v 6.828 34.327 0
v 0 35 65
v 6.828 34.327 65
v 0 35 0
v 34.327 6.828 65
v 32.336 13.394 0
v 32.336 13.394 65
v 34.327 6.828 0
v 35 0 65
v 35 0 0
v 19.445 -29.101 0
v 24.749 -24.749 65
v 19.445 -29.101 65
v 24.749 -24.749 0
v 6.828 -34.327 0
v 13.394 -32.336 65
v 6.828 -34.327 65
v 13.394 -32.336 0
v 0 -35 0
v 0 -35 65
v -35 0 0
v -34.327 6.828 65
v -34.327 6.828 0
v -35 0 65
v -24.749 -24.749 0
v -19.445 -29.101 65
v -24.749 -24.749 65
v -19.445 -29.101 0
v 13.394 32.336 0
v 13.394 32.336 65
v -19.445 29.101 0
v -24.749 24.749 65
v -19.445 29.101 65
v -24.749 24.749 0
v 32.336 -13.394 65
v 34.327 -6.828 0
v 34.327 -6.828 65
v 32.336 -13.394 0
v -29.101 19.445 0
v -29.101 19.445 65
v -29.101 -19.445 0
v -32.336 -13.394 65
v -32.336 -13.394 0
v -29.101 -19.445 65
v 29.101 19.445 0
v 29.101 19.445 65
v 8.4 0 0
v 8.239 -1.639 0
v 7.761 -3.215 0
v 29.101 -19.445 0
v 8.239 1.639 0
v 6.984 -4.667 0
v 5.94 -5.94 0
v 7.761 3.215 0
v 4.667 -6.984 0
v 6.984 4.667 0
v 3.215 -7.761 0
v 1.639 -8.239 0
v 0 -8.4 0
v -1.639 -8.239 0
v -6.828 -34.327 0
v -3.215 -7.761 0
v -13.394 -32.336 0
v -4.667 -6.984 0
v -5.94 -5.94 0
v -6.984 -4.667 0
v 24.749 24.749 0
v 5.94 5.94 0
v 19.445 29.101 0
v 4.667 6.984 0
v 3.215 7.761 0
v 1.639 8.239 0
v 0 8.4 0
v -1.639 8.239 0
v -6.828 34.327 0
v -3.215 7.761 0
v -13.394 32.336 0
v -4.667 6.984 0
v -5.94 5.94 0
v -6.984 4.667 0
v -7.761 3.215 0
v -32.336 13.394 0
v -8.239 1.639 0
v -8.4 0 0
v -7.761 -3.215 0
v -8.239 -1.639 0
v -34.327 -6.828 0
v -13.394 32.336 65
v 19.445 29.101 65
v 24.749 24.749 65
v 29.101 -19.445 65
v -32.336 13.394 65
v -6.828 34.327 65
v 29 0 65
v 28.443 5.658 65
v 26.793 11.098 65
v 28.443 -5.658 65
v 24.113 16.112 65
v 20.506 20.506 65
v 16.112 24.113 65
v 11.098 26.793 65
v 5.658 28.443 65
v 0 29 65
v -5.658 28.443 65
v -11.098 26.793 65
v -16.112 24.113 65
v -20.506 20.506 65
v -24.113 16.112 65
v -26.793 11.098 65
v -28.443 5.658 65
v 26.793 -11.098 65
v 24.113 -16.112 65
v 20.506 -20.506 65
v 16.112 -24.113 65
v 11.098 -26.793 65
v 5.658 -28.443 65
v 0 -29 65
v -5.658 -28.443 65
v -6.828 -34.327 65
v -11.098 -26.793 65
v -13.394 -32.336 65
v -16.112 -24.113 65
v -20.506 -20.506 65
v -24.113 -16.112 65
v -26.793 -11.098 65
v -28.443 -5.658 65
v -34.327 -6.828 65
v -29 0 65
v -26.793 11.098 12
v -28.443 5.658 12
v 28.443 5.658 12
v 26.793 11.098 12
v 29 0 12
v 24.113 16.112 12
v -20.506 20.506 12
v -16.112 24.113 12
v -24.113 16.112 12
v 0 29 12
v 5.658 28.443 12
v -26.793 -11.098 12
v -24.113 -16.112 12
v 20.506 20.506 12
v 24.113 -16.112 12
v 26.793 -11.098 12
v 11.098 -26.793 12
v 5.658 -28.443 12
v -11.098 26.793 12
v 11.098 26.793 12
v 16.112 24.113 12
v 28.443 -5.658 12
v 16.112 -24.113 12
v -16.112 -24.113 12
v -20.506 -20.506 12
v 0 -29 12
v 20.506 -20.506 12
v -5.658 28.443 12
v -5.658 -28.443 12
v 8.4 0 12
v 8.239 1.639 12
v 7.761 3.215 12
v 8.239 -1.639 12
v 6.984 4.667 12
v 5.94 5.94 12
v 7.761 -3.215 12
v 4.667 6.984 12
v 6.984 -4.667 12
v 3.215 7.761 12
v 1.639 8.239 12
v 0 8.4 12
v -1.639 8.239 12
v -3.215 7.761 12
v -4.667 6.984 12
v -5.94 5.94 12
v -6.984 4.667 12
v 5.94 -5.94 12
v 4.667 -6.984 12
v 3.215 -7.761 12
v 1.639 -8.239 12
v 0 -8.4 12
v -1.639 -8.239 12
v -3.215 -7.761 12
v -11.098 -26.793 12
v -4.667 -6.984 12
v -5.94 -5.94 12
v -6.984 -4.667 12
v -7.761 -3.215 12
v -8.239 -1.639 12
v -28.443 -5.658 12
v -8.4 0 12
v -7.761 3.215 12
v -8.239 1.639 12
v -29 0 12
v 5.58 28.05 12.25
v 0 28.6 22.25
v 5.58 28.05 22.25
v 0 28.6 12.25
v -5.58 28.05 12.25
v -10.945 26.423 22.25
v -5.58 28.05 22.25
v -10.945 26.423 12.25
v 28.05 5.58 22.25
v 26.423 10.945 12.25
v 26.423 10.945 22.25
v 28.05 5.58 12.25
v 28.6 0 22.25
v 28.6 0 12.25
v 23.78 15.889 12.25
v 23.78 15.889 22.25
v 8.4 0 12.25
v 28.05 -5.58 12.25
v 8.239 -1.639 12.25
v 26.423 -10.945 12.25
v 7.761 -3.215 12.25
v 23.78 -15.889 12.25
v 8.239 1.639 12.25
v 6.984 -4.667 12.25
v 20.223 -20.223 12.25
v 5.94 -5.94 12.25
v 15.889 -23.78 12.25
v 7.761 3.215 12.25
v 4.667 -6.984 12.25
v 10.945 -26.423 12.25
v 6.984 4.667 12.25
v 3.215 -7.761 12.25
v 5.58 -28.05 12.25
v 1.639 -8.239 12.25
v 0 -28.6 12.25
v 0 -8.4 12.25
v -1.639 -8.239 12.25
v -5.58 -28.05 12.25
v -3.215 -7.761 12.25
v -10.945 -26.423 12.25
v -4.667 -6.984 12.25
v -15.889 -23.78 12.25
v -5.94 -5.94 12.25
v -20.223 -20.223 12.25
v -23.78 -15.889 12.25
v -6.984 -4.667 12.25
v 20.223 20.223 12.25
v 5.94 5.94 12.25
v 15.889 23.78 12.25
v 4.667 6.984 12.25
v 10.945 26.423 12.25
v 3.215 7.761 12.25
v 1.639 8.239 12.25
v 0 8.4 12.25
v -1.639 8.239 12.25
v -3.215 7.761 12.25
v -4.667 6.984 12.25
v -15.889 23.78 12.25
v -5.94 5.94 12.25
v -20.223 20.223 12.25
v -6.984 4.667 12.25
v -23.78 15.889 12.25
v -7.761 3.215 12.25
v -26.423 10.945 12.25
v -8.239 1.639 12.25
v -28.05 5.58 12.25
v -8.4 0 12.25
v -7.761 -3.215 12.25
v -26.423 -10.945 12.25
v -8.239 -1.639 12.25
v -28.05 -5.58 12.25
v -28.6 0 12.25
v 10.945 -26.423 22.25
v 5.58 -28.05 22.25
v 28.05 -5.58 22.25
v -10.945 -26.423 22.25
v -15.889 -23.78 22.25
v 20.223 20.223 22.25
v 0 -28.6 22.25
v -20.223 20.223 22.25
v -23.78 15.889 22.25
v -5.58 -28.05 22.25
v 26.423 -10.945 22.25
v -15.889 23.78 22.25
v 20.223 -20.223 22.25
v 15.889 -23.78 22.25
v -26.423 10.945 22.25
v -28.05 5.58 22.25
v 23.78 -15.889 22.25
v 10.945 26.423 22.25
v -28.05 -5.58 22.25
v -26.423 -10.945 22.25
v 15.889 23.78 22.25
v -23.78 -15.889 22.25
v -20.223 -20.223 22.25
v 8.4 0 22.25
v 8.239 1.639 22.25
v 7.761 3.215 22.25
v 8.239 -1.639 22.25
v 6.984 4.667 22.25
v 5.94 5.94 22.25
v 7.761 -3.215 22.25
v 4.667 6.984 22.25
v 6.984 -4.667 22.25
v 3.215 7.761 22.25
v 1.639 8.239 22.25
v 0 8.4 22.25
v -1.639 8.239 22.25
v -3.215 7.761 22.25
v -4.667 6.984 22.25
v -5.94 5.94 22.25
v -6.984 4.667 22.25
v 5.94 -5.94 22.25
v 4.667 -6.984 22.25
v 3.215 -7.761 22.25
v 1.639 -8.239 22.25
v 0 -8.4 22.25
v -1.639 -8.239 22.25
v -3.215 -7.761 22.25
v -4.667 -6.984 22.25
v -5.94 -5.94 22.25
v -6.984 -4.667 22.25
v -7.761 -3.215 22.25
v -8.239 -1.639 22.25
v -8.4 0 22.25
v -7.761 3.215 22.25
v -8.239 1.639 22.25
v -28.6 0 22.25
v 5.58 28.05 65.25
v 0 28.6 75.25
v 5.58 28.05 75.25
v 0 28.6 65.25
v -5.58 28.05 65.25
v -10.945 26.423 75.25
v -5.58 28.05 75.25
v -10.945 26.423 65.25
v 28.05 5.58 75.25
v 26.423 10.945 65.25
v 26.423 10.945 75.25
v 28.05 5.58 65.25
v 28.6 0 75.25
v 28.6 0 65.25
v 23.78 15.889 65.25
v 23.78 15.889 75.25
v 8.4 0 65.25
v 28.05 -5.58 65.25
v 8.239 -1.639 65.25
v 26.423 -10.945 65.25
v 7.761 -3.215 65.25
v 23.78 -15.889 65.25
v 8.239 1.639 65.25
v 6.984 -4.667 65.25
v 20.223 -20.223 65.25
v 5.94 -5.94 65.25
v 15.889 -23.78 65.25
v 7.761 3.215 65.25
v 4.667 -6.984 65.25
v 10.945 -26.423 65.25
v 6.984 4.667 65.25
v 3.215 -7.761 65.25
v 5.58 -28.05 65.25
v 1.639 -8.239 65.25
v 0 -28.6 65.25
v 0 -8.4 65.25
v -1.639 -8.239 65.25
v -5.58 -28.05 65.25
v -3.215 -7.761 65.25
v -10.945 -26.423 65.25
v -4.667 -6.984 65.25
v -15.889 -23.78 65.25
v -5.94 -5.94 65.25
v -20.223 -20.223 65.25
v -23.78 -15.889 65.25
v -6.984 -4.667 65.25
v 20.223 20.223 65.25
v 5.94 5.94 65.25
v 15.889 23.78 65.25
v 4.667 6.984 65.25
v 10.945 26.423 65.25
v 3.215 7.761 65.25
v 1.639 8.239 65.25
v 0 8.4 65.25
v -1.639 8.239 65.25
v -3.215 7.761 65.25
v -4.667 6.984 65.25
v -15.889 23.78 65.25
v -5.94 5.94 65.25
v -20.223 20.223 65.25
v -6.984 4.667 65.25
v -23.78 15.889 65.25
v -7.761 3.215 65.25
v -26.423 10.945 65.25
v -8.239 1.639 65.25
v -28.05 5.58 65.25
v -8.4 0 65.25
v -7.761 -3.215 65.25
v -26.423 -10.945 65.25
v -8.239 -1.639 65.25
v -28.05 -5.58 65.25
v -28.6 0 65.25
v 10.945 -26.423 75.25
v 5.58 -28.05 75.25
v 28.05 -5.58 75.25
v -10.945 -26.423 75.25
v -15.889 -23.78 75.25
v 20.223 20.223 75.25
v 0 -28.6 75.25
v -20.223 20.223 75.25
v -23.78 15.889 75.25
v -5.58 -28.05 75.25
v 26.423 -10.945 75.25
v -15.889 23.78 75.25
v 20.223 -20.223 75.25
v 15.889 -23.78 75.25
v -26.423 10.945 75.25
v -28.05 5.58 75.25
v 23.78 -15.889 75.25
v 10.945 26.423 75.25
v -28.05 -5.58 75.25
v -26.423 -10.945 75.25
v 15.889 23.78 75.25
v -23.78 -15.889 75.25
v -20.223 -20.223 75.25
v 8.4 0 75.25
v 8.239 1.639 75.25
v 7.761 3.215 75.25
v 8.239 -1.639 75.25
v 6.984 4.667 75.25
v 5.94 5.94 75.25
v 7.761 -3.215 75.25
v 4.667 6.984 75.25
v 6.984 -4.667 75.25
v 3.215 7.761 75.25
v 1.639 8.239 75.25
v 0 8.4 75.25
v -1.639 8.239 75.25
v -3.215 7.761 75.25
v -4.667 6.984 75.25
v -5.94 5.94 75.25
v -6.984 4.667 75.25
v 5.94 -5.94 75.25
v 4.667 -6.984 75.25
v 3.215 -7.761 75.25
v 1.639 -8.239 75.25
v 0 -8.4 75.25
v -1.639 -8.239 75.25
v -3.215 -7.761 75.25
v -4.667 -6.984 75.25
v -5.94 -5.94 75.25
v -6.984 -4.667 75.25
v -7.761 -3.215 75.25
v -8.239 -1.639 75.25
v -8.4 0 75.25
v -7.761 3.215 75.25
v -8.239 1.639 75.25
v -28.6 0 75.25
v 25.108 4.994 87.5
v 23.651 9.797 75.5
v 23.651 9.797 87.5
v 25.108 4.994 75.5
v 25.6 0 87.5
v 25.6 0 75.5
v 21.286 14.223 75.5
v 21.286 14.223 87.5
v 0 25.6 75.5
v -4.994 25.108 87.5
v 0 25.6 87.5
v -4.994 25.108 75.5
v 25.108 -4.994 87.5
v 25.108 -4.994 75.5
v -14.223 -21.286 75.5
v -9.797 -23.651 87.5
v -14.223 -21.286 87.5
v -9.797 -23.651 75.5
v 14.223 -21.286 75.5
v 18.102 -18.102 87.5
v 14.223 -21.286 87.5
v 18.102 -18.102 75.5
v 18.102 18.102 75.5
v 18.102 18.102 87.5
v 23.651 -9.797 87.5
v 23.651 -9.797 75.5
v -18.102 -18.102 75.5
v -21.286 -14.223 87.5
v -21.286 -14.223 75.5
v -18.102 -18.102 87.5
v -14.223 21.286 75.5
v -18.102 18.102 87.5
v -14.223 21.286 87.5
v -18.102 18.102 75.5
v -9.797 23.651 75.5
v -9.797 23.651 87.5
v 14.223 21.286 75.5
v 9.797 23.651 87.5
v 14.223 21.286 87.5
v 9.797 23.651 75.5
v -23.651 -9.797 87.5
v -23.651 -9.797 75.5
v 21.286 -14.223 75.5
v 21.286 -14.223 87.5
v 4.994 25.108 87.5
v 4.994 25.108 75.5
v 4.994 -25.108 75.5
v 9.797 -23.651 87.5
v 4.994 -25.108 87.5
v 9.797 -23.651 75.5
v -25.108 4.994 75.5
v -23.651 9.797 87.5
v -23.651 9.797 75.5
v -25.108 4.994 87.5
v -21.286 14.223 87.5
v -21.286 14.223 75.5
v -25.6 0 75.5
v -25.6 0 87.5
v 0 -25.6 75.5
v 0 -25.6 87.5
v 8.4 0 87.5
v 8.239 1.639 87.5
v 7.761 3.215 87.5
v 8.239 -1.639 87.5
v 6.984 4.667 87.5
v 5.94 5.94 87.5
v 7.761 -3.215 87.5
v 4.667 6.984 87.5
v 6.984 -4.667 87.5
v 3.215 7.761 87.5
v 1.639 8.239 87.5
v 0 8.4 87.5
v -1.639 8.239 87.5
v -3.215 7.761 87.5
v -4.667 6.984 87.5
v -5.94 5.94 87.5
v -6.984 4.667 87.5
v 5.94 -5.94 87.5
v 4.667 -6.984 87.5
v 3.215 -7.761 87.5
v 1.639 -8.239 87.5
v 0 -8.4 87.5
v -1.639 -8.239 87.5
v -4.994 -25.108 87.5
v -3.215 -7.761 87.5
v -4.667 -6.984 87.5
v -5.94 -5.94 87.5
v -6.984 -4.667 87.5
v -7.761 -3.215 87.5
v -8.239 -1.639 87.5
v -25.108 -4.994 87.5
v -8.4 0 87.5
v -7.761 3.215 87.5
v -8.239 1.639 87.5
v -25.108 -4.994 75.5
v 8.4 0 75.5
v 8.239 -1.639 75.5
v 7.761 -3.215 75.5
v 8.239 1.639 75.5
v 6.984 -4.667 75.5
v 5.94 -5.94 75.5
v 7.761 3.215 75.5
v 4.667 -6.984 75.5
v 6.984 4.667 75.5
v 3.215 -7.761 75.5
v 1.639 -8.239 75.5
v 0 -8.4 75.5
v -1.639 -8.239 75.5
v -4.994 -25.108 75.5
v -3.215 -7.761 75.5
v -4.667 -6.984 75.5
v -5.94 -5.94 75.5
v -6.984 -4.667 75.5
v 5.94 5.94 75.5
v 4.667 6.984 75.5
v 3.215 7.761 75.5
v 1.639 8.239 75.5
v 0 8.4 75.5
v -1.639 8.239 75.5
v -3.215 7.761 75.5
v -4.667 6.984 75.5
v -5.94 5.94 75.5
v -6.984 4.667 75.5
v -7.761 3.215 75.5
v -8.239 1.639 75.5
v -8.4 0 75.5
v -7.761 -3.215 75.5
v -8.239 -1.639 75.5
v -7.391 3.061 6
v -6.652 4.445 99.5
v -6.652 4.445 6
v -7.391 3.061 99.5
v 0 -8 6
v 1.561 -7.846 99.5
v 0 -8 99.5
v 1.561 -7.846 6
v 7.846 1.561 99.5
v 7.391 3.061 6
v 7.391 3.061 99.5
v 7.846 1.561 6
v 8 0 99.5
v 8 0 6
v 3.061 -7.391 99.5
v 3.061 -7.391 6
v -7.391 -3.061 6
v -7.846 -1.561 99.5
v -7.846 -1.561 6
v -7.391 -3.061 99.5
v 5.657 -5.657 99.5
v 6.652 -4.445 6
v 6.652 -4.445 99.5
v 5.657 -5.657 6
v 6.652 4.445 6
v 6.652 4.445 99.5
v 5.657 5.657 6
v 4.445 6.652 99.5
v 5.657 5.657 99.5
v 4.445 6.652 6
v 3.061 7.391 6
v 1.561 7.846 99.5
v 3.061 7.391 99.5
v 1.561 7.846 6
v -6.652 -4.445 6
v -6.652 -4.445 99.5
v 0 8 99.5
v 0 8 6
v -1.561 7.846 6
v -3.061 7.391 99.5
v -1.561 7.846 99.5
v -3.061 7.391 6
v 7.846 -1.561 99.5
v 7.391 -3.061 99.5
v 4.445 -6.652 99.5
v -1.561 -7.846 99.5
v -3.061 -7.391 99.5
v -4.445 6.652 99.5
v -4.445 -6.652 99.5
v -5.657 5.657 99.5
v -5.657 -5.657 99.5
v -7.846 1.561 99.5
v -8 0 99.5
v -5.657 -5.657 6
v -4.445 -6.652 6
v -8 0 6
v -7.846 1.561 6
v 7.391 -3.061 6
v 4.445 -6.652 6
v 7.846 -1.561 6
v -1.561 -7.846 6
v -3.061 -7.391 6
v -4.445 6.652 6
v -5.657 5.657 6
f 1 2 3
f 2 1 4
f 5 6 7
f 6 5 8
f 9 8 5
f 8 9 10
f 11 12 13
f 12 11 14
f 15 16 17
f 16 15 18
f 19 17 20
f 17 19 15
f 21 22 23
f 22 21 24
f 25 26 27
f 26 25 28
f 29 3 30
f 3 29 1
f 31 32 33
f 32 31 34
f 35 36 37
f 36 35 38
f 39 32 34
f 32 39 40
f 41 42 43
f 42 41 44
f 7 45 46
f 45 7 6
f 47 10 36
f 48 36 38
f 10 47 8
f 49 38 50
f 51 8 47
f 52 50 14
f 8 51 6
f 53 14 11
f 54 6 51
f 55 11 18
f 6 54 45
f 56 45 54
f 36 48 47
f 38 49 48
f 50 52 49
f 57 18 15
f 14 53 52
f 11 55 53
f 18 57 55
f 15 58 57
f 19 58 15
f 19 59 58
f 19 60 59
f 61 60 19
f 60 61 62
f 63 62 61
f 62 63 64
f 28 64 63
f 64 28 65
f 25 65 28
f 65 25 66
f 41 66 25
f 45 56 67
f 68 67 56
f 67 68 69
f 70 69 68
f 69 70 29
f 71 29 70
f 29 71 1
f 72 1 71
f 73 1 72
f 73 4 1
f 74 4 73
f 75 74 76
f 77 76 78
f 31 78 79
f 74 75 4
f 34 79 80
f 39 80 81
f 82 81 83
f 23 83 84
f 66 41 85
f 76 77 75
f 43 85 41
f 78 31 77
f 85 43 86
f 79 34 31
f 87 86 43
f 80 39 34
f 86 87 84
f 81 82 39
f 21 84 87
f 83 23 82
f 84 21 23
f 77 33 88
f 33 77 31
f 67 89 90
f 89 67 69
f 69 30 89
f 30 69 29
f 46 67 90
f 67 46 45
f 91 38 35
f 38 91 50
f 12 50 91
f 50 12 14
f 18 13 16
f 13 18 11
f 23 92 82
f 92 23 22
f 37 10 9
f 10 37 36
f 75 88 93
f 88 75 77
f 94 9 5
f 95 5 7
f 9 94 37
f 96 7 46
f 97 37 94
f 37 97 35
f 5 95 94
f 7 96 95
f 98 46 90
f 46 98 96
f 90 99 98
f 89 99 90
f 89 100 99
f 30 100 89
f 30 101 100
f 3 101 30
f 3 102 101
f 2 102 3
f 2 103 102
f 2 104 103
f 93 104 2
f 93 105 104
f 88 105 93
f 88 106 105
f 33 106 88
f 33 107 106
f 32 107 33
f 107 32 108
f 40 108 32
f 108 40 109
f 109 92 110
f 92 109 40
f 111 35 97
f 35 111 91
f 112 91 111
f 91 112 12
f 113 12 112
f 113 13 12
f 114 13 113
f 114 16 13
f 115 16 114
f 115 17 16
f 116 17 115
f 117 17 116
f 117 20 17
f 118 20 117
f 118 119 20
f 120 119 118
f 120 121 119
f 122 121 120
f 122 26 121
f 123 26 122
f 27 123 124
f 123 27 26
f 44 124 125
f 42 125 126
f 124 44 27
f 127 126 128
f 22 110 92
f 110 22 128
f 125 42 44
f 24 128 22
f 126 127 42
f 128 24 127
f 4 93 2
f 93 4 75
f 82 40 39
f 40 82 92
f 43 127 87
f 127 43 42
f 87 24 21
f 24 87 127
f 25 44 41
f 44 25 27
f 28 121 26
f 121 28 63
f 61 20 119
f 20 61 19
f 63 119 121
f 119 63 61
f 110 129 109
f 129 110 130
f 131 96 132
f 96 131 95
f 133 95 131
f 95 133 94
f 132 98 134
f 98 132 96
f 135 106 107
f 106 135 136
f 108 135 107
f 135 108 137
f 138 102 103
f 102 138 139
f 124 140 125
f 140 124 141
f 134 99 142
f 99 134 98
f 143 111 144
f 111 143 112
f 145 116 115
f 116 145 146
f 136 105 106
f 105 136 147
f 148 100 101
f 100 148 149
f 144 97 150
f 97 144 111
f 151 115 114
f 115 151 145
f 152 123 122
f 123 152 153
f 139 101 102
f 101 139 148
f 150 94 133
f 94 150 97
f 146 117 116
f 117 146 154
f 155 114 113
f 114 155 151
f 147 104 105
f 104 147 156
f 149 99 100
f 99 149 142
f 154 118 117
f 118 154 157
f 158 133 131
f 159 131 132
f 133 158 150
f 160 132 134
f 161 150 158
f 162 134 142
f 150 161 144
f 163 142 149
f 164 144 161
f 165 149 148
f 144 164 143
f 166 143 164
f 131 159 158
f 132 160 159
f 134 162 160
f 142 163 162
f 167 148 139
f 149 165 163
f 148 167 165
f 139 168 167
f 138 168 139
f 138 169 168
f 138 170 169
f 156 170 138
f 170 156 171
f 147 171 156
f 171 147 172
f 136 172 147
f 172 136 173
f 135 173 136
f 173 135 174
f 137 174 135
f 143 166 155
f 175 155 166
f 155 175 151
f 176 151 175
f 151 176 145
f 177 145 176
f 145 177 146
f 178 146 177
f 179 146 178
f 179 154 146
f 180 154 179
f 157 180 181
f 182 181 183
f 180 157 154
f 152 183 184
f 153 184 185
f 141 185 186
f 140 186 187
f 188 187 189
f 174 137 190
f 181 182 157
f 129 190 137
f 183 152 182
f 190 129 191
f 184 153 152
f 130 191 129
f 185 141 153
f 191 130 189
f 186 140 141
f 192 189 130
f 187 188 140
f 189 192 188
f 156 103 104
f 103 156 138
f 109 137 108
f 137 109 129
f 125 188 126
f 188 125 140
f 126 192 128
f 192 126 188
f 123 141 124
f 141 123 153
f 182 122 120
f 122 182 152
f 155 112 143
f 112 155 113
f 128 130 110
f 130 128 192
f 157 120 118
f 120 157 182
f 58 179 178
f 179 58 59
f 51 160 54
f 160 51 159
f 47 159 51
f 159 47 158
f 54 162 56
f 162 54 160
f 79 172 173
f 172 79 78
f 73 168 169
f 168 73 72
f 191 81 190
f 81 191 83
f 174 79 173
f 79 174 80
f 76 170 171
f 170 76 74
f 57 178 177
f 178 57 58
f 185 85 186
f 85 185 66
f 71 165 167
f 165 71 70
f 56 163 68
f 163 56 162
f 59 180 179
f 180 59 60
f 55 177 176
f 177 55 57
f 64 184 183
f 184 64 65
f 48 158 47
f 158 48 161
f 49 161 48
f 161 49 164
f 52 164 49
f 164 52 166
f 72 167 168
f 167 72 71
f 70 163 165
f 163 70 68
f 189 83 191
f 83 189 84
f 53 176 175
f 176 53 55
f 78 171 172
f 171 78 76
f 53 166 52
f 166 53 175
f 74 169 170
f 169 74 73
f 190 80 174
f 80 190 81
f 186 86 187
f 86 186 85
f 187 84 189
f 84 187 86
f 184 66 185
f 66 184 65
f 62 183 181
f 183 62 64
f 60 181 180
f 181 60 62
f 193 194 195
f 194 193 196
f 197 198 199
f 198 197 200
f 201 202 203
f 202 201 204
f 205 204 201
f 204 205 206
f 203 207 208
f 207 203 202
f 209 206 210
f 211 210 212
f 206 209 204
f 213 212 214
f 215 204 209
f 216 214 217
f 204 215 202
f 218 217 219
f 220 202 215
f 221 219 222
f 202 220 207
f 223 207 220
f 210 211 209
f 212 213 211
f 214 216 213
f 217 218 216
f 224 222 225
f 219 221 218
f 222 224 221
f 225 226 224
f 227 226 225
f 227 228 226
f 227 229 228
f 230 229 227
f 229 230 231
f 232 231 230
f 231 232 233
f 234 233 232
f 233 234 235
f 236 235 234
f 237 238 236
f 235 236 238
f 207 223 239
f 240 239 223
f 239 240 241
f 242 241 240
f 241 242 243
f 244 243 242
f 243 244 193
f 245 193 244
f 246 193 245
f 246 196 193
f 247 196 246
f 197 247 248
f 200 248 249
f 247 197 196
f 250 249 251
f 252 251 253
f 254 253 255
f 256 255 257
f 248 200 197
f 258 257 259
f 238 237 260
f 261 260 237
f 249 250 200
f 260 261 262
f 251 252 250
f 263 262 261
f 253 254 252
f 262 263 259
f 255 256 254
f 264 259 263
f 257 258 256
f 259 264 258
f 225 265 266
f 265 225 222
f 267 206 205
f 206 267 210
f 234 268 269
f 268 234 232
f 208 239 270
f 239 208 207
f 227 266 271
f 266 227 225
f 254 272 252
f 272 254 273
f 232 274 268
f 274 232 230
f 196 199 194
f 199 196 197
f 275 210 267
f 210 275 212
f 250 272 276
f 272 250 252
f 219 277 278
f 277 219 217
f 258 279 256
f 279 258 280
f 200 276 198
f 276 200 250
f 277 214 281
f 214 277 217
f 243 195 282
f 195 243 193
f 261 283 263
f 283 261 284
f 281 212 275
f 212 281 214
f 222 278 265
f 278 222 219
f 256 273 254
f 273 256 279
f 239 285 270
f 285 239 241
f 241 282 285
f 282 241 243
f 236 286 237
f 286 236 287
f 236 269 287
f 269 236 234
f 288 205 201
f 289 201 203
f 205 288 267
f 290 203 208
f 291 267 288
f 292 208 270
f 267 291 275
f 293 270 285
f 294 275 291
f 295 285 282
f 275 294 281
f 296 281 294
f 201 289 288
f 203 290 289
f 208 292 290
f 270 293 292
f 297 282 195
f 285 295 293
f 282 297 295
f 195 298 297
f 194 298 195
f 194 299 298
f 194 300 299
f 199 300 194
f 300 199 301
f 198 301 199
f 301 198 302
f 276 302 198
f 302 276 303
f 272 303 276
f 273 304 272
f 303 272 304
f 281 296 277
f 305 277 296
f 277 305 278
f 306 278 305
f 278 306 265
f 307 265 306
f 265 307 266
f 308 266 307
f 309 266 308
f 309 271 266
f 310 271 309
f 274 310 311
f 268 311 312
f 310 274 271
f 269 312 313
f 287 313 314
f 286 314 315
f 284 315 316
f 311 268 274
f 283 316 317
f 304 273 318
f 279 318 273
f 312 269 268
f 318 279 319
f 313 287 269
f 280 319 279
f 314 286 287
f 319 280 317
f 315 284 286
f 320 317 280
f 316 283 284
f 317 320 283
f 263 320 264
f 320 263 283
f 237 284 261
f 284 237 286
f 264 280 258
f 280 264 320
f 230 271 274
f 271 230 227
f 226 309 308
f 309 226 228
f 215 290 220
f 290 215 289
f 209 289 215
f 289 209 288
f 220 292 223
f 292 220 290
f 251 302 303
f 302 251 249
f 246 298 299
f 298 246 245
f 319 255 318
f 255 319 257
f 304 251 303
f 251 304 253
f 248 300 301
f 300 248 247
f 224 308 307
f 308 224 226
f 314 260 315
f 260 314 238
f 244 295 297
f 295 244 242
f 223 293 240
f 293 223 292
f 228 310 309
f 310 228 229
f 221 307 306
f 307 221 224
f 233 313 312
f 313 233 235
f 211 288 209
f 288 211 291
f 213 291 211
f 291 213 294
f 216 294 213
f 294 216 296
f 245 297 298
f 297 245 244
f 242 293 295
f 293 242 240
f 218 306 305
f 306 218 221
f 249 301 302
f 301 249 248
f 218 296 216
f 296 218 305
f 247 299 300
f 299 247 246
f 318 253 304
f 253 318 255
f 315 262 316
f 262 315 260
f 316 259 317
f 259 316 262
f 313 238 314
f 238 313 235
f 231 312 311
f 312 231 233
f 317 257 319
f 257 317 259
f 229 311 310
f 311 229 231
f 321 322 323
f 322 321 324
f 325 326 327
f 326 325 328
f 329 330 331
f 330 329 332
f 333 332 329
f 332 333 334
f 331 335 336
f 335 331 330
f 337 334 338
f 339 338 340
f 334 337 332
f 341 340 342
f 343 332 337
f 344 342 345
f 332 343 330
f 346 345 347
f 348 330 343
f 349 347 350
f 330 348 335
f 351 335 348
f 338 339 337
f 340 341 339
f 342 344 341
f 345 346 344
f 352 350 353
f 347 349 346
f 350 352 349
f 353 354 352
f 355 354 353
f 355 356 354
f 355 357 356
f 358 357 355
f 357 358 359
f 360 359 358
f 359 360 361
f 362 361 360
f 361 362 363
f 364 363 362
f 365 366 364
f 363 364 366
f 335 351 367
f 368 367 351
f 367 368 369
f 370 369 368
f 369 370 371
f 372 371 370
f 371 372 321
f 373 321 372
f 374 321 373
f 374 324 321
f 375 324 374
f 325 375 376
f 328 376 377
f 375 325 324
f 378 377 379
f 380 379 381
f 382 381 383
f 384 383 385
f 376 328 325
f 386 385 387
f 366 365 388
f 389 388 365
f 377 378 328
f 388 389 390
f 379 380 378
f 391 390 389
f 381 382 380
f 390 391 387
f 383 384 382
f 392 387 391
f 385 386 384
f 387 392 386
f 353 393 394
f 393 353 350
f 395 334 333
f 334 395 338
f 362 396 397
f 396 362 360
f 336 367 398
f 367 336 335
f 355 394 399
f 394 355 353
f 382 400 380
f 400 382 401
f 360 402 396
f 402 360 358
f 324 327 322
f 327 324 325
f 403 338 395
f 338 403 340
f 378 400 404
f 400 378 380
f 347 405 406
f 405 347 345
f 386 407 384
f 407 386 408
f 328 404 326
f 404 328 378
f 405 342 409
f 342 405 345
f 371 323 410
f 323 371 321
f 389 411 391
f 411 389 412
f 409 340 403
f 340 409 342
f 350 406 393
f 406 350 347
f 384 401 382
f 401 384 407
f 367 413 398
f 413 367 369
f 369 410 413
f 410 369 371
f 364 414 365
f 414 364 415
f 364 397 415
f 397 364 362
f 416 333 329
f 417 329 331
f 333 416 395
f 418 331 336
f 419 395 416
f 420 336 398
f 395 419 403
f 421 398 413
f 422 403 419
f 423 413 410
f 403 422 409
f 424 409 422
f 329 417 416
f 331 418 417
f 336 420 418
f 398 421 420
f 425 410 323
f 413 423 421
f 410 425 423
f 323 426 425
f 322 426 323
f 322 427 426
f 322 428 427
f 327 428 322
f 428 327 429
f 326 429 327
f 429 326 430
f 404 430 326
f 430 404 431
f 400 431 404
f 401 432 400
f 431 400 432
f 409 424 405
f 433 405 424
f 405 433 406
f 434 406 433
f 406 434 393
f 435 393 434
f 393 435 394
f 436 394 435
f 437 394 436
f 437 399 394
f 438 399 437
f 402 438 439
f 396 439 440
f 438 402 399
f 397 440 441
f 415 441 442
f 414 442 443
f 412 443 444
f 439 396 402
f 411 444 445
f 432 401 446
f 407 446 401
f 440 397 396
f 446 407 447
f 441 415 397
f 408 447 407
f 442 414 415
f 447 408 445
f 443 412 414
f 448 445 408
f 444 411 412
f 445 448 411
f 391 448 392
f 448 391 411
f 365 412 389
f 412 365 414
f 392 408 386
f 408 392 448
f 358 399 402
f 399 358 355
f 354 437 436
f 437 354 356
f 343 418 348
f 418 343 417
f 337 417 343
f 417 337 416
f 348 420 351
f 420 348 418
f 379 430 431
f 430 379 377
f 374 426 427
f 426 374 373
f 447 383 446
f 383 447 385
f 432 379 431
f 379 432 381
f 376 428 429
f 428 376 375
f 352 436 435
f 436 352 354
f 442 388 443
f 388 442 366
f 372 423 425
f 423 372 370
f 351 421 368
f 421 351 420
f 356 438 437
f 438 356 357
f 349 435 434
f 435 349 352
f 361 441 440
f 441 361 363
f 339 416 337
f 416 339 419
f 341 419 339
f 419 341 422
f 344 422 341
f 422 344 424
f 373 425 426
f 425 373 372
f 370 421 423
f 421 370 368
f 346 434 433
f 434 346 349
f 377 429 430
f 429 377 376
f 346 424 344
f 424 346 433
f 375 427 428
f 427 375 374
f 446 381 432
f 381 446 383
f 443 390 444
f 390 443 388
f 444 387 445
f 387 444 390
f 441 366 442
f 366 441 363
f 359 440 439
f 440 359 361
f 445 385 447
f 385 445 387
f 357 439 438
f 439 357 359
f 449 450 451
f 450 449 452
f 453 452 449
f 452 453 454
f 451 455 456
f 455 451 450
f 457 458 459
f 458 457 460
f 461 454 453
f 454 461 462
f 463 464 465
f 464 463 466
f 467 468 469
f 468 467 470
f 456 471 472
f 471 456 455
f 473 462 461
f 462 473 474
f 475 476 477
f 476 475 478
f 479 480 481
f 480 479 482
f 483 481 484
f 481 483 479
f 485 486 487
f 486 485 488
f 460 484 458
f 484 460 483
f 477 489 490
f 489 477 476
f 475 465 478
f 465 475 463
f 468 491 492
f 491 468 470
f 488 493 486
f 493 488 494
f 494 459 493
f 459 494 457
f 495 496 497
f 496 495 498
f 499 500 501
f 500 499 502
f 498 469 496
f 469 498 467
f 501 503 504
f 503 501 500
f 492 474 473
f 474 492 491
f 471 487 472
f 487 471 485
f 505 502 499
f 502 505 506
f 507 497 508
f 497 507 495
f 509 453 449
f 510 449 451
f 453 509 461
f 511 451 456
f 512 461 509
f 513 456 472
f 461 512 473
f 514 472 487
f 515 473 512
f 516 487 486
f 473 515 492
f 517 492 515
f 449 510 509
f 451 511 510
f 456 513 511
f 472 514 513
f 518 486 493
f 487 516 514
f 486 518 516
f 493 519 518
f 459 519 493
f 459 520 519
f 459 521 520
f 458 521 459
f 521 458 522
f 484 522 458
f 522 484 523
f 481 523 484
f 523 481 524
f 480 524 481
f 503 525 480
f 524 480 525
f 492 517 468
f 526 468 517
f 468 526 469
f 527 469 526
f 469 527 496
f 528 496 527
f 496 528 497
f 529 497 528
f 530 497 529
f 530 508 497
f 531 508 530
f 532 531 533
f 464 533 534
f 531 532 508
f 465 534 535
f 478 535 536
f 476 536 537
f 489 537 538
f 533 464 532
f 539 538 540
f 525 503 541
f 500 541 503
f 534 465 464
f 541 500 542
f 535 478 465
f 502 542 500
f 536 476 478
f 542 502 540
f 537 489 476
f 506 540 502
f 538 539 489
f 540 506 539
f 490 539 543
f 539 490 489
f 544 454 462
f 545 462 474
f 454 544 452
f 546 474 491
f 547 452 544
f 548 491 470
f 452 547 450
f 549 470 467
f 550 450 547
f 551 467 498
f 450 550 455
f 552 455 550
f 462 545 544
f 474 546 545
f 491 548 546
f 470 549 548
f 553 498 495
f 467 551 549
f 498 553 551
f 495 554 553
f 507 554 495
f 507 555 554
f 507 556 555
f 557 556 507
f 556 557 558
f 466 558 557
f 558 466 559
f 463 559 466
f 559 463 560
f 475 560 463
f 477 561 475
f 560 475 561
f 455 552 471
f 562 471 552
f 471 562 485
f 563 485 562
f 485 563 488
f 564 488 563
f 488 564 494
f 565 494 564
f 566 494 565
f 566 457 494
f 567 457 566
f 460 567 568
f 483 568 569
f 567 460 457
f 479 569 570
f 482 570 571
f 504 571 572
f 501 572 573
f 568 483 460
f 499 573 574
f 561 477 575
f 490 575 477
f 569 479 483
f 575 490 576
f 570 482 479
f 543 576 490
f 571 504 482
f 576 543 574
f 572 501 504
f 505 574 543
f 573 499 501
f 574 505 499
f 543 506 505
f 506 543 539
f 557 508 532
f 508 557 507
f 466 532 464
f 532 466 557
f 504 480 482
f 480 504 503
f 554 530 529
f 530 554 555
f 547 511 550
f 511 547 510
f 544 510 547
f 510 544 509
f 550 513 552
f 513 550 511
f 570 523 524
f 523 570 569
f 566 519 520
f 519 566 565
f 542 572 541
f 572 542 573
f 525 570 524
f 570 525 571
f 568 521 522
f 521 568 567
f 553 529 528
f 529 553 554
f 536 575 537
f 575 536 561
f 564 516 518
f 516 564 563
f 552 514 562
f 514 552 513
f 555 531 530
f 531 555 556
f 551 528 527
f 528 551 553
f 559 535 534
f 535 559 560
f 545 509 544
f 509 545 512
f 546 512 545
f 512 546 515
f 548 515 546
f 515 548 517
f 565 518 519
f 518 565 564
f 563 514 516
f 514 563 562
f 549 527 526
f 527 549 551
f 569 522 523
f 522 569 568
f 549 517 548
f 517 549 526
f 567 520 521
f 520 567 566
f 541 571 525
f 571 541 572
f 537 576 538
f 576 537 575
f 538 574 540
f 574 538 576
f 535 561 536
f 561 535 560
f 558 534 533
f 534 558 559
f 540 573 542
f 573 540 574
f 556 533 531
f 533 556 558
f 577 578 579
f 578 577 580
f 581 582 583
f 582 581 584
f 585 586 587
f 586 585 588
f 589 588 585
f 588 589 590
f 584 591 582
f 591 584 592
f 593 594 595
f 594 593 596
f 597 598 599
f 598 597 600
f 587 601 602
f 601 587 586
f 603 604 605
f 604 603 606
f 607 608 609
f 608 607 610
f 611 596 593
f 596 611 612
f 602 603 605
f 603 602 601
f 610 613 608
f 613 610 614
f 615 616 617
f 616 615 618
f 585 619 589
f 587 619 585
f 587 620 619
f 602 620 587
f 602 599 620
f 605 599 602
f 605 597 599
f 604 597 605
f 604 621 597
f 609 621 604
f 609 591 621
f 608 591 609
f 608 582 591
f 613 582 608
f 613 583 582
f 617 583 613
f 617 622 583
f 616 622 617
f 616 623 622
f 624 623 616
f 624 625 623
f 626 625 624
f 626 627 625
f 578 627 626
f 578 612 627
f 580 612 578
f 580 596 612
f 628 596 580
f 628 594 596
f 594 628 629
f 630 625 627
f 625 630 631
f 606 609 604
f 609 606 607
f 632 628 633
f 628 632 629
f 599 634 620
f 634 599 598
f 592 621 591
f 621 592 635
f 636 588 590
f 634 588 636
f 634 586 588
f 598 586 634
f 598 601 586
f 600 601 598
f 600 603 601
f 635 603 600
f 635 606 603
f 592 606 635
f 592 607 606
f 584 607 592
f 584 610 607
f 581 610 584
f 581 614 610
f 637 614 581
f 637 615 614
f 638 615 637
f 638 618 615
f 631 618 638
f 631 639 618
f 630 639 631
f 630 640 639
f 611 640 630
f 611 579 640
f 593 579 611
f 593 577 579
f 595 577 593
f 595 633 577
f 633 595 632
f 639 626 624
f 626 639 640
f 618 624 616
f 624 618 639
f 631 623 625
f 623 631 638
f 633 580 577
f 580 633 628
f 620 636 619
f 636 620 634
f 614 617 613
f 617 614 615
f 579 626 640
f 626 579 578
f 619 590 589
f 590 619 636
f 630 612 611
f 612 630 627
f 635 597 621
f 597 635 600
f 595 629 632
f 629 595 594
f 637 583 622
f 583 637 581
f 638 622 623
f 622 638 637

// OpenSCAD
$fn = 32;

// ------------------------------------------------------------------------
// Bearing housing: housing d70, two bearings and a shaft
// Every part is its own module, assembly() places them once.
// ------------------------------------------------------------------------

// --- part 1 ---
module housing() {
  difference() {
    cylinder(h = 65, d = 70);
    translate([0, 0, 12]) cylinder(h = 54, d = 58);
    translate([0, 0, -1]) cylinder(h = 14, d = 16.8);
  }
}

// --- part 2 ---
module bearing_lower() {
  difference() {
      translate([0, 0, 0]) cylinder(h = 10, d = 57.2);
      translate([0, 0, -1]) cylinder(h = 12, d = 16.8);
    }
}

// --- part 3 ---
module bearing_upper() {
  difference() {
      translate([0, 0, 0]) cylinder(h = 10, d = 57.2);
      translate([0, 0, -1]) cylinder(h = 12, d = 16.8);
    }
}

// --- part 4 ---
module spacer() {
  difference() {
      translate([0, 0, 0]) cylinder(h = 12, d = 51.2);
      translate([0, 0, -1]) cylinder(h = 14, d = 16.8);
    }
}

// --- part 5 ---
module shaft() {
  translate([0, 0, -46.75]) cylinder(h = 93.5, d = 16);
}

// --- assembly ---
module assembly() {
  translate([0, 0, 0]) rotate([0, 0, 0]) housing();
  translate([0, 0, 12.25]) rotate([0, 0, 0]) bearing_lower();
  translate([0, 0, 65.25]) rotate([0, 0, 0]) bearing_upper();
  translate([0, 0, 75.5]) rotate([0, 0, 0]) spacer();
  translate([0, 0, 52.75]) rotate([0, 0, 0]) shaft();
}

assembly();
